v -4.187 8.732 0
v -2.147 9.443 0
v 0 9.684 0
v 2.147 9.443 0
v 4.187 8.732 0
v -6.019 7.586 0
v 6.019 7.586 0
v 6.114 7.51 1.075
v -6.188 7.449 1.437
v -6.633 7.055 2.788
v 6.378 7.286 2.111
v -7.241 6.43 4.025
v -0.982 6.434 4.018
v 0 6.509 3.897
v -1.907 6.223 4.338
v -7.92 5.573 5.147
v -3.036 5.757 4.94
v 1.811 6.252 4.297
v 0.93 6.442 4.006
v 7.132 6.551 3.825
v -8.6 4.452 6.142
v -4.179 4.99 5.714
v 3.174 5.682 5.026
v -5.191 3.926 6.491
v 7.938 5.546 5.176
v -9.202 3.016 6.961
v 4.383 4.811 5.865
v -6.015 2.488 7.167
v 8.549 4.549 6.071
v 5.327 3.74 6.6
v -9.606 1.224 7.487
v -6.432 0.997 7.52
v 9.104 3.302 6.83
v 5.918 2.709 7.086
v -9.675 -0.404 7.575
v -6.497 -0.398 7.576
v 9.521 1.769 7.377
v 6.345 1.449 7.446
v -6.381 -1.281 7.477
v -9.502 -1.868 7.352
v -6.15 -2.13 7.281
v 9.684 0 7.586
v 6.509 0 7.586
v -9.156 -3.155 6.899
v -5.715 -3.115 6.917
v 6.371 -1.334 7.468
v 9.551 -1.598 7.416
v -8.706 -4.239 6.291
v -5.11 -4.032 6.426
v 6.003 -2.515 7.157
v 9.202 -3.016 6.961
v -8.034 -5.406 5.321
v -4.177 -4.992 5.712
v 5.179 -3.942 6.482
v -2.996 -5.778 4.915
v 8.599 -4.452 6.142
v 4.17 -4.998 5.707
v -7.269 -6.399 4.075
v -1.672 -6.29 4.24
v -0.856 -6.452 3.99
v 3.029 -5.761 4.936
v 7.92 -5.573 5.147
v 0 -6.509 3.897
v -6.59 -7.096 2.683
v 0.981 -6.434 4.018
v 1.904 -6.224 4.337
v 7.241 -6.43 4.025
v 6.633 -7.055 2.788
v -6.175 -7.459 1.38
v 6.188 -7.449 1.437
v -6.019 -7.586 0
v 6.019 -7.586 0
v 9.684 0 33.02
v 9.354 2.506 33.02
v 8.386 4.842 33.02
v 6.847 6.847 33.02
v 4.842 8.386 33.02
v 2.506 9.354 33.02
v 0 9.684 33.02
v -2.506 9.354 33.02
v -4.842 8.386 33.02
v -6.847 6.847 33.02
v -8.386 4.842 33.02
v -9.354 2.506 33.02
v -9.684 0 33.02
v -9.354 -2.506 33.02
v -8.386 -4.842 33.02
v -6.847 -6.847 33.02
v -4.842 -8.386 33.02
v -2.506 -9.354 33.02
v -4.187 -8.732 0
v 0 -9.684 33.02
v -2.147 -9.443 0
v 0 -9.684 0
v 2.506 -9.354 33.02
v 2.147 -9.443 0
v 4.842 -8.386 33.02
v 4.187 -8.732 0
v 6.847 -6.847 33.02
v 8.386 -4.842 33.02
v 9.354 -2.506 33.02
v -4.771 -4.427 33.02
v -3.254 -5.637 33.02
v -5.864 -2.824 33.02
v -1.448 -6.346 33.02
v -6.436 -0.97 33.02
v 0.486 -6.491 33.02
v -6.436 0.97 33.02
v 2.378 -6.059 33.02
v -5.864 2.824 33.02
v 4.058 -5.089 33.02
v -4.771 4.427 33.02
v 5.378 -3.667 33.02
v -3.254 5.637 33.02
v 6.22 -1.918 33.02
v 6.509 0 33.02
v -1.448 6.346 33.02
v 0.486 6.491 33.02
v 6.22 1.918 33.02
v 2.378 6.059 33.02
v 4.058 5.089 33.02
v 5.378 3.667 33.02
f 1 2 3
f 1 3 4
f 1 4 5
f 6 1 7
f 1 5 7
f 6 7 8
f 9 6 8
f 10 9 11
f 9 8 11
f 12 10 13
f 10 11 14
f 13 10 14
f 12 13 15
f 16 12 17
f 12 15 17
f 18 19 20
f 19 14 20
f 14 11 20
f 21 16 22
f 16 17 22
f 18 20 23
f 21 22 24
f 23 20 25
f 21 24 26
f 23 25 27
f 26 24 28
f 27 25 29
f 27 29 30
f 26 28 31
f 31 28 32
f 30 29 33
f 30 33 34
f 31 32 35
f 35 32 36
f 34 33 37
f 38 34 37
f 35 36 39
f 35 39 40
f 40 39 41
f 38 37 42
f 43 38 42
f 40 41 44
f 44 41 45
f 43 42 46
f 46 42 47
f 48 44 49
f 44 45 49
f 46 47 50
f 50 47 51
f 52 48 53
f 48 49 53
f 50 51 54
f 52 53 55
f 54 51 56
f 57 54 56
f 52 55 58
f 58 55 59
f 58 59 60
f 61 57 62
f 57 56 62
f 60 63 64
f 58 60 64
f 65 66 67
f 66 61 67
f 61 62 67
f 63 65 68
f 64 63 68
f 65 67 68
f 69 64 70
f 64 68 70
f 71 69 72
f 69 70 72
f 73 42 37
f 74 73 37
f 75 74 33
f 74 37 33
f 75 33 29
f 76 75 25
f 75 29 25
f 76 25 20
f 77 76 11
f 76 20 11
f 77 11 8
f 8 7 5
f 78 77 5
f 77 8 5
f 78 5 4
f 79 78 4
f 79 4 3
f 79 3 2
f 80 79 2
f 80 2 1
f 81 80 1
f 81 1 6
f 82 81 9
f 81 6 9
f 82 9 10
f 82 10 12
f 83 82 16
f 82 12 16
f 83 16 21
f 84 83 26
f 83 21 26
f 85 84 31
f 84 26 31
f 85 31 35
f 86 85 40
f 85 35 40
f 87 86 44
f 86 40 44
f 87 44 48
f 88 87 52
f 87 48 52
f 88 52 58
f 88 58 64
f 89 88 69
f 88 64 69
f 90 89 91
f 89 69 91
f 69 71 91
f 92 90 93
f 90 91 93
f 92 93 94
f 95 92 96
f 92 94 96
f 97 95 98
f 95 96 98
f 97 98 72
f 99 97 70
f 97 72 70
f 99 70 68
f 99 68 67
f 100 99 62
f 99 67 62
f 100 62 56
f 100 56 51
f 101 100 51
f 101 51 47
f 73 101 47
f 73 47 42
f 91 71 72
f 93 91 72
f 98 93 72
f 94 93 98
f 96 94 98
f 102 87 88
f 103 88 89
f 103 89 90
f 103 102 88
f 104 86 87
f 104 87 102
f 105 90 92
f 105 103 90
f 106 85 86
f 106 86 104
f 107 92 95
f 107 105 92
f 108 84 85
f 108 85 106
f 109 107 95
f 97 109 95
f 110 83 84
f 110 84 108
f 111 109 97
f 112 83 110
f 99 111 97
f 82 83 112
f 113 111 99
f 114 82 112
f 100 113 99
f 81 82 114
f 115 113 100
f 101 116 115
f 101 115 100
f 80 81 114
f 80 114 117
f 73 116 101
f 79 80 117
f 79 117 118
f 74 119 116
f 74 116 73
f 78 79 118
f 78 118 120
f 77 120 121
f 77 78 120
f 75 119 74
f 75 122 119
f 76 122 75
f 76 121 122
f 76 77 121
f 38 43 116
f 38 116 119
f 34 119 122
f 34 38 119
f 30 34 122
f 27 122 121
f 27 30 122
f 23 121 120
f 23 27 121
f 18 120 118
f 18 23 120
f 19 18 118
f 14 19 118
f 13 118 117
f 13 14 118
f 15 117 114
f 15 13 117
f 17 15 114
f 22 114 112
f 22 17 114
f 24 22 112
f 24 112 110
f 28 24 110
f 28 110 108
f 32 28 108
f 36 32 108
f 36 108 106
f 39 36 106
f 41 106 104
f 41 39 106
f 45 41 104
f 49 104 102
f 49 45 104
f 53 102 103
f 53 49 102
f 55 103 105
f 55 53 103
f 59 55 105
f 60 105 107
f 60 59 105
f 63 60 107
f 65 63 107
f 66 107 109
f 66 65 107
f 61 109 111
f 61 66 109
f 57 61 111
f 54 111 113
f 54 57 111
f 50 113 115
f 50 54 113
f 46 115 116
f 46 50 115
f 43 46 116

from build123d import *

# Parameters (mm, degrees)
F0_R     = 9.68375
F0_R_2   = 6.50875
F1_DEPTH = 33.02
F3_DEPTH = 25
F4_DEPTH = 54.6


with BuildPart() as f1:
    # F0 (on Top) → F1 (new body)
    with BuildSketch(Plane.XY):
        Circle(F0_R)
        Circle(F0_R_2, mode=Mode.SUBTRACT)
    extrude(amount=F1_DEPTH)

    # F2 (on Right) → F3 (cut)
    with BuildSketch(Plane.YZ):
        with BuildLine():
            ThreePointArc((7.586009, 0), (0, 7.586009), (-7.586009, 0))
            Line((-7.586009, 0), (7.586009, 0))
        make_face()
    extrude(amount=-F3_DEPTH, mode=Mode.SUBTRACT)

    # F2 (on Right) → F4 (cut)
    with BuildSketch(Plane.YZ):
        with BuildLine():
            ThreePointArc((7.586009, 0), (0, 7.586009), (-7.586009, 0))
            Line((-7.586009, 0), (7.586009, 0))
        make_face()
    extrude(amount=F4_DEPTH, mode=Mode.SUBTRACT)


solid = f1.part
